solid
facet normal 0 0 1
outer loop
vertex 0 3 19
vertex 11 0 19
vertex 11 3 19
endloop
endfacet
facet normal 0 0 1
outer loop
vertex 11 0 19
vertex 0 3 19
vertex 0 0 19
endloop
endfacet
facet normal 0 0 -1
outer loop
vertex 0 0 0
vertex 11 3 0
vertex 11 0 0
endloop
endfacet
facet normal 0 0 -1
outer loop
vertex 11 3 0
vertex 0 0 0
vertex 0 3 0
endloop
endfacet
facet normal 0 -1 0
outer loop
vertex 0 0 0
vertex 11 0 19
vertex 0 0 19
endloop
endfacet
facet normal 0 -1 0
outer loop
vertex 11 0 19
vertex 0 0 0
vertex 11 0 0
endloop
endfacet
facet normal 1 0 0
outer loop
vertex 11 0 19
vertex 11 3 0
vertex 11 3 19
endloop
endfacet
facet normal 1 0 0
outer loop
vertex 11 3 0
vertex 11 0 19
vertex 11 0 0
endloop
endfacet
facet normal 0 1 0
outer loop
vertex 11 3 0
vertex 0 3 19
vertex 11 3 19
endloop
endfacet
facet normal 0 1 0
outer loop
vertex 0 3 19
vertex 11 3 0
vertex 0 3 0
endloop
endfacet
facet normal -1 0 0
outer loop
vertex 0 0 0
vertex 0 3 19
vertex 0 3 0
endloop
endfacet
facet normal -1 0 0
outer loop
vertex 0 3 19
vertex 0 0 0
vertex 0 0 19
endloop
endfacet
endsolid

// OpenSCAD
// Generated by SolidPython 1.0.1 on 2020-07-29 00:46:55


cube(size = [11, 3, 19]);
/***********************************************
*********      SolidPython code:      **********
************************************************
 
# import packages: SolidPython
from solid import *
from solid.utils import *
from itertools import chain, combinations, permutations


class Resize:

    def __init__(self, scad_file):
        self.scad_file = scad_file
        #self.scad_file = import_scad(scad_file)
        # cone/cylinder param:
        self.r1 = 0
        self.r2 = 0
        self.h = 0
        # rectangular prism param:
        self.w = 0
        self.l = 0
        # ellipse param:
        self.r = 0

    # import OpenScad code (file name corresponds to shape)


    # classify shape + parameters
    def assign(self, param1, param2, param3):
        if self.scad_file == 'cone.scad':
            self.r1 = param1
            self.r2 = param2
            self.h = param3
        elif self.scad_file == 'cylinder.scad':
            self.r1 = param1
            self.r2 = param2
            self.h = param3
        elif self.scad_file == 'rectangularPrism.scad':
            self.h = param1
            self.l = param2
            self.w = param3
        else:
            self.r = param1
            self.h = param2

    # resize parameters
    def iterate(self):
        x = range(3, 20, 2)
        i = 1
        if self.scad_file == 'cone.scad':
            tempList = list(permutations(x, 2))
            for temp in tempList:
                param1 = temp[0]
                param2 = temp[1]
                filepath = 'produced_scad_files/' + 'cone' + str(param1) + '_' + str(param2) + '_' + '.scad'
                scad_render_to_file(cylinder(h=param1, r1=param2, r2=0), filepath)

        elif self.scad_file == 'cylinder.scad':
            tempList = list(permutations(x, 3))
            for temp in tempList:
                param1 = temp[0]
                param2 = temp[1]
                filepath = 'produced_scad_files/' + 'cylinder' + str(param1) + '_' + str(param2) + '_' + '.scad'
                scad_render_to_file(cylinder(h=param1, r1=param2, r2=param2), filepath)

        elif self.scad_file == 'rectangularPrism.scad':
            tempList = list(permutations(x, 3))
            for temp in tempList:
                param1 = temp[0]
                param2 = temp[1]
                param3 = temp[2]
                filepath = 'produced_scad_files/' + 'rectangularPrism' + str(param1) + '_' + str(param2) + '_' + str(
                    param3) + '.scad'
                scad_render_to_file(cube(size=(param1, param2, param3)), filepath)

        elif self.scad_file == 'ellipse.scad':
            tempList = list(permutations(x, 4))
            for temp in tempList:
                param1 = temp[0]
                param2 = temp[1]
                param3 = temp[2]
                param4 = temp[3]
                filepath = 'produced_scad_files/' + 'ellipse' + str(param1) + '_' + str(param2) + '_' + str(param3) + '_' + str(param4) + '.scad'
                scad_render_to_file(scale([param1, param2, param3])(sphere(r=param4)), filepath)

    def render_to_scadfile(self):
        scad_render_to_file(scad, 'example.scad') 
 
************************************************/
